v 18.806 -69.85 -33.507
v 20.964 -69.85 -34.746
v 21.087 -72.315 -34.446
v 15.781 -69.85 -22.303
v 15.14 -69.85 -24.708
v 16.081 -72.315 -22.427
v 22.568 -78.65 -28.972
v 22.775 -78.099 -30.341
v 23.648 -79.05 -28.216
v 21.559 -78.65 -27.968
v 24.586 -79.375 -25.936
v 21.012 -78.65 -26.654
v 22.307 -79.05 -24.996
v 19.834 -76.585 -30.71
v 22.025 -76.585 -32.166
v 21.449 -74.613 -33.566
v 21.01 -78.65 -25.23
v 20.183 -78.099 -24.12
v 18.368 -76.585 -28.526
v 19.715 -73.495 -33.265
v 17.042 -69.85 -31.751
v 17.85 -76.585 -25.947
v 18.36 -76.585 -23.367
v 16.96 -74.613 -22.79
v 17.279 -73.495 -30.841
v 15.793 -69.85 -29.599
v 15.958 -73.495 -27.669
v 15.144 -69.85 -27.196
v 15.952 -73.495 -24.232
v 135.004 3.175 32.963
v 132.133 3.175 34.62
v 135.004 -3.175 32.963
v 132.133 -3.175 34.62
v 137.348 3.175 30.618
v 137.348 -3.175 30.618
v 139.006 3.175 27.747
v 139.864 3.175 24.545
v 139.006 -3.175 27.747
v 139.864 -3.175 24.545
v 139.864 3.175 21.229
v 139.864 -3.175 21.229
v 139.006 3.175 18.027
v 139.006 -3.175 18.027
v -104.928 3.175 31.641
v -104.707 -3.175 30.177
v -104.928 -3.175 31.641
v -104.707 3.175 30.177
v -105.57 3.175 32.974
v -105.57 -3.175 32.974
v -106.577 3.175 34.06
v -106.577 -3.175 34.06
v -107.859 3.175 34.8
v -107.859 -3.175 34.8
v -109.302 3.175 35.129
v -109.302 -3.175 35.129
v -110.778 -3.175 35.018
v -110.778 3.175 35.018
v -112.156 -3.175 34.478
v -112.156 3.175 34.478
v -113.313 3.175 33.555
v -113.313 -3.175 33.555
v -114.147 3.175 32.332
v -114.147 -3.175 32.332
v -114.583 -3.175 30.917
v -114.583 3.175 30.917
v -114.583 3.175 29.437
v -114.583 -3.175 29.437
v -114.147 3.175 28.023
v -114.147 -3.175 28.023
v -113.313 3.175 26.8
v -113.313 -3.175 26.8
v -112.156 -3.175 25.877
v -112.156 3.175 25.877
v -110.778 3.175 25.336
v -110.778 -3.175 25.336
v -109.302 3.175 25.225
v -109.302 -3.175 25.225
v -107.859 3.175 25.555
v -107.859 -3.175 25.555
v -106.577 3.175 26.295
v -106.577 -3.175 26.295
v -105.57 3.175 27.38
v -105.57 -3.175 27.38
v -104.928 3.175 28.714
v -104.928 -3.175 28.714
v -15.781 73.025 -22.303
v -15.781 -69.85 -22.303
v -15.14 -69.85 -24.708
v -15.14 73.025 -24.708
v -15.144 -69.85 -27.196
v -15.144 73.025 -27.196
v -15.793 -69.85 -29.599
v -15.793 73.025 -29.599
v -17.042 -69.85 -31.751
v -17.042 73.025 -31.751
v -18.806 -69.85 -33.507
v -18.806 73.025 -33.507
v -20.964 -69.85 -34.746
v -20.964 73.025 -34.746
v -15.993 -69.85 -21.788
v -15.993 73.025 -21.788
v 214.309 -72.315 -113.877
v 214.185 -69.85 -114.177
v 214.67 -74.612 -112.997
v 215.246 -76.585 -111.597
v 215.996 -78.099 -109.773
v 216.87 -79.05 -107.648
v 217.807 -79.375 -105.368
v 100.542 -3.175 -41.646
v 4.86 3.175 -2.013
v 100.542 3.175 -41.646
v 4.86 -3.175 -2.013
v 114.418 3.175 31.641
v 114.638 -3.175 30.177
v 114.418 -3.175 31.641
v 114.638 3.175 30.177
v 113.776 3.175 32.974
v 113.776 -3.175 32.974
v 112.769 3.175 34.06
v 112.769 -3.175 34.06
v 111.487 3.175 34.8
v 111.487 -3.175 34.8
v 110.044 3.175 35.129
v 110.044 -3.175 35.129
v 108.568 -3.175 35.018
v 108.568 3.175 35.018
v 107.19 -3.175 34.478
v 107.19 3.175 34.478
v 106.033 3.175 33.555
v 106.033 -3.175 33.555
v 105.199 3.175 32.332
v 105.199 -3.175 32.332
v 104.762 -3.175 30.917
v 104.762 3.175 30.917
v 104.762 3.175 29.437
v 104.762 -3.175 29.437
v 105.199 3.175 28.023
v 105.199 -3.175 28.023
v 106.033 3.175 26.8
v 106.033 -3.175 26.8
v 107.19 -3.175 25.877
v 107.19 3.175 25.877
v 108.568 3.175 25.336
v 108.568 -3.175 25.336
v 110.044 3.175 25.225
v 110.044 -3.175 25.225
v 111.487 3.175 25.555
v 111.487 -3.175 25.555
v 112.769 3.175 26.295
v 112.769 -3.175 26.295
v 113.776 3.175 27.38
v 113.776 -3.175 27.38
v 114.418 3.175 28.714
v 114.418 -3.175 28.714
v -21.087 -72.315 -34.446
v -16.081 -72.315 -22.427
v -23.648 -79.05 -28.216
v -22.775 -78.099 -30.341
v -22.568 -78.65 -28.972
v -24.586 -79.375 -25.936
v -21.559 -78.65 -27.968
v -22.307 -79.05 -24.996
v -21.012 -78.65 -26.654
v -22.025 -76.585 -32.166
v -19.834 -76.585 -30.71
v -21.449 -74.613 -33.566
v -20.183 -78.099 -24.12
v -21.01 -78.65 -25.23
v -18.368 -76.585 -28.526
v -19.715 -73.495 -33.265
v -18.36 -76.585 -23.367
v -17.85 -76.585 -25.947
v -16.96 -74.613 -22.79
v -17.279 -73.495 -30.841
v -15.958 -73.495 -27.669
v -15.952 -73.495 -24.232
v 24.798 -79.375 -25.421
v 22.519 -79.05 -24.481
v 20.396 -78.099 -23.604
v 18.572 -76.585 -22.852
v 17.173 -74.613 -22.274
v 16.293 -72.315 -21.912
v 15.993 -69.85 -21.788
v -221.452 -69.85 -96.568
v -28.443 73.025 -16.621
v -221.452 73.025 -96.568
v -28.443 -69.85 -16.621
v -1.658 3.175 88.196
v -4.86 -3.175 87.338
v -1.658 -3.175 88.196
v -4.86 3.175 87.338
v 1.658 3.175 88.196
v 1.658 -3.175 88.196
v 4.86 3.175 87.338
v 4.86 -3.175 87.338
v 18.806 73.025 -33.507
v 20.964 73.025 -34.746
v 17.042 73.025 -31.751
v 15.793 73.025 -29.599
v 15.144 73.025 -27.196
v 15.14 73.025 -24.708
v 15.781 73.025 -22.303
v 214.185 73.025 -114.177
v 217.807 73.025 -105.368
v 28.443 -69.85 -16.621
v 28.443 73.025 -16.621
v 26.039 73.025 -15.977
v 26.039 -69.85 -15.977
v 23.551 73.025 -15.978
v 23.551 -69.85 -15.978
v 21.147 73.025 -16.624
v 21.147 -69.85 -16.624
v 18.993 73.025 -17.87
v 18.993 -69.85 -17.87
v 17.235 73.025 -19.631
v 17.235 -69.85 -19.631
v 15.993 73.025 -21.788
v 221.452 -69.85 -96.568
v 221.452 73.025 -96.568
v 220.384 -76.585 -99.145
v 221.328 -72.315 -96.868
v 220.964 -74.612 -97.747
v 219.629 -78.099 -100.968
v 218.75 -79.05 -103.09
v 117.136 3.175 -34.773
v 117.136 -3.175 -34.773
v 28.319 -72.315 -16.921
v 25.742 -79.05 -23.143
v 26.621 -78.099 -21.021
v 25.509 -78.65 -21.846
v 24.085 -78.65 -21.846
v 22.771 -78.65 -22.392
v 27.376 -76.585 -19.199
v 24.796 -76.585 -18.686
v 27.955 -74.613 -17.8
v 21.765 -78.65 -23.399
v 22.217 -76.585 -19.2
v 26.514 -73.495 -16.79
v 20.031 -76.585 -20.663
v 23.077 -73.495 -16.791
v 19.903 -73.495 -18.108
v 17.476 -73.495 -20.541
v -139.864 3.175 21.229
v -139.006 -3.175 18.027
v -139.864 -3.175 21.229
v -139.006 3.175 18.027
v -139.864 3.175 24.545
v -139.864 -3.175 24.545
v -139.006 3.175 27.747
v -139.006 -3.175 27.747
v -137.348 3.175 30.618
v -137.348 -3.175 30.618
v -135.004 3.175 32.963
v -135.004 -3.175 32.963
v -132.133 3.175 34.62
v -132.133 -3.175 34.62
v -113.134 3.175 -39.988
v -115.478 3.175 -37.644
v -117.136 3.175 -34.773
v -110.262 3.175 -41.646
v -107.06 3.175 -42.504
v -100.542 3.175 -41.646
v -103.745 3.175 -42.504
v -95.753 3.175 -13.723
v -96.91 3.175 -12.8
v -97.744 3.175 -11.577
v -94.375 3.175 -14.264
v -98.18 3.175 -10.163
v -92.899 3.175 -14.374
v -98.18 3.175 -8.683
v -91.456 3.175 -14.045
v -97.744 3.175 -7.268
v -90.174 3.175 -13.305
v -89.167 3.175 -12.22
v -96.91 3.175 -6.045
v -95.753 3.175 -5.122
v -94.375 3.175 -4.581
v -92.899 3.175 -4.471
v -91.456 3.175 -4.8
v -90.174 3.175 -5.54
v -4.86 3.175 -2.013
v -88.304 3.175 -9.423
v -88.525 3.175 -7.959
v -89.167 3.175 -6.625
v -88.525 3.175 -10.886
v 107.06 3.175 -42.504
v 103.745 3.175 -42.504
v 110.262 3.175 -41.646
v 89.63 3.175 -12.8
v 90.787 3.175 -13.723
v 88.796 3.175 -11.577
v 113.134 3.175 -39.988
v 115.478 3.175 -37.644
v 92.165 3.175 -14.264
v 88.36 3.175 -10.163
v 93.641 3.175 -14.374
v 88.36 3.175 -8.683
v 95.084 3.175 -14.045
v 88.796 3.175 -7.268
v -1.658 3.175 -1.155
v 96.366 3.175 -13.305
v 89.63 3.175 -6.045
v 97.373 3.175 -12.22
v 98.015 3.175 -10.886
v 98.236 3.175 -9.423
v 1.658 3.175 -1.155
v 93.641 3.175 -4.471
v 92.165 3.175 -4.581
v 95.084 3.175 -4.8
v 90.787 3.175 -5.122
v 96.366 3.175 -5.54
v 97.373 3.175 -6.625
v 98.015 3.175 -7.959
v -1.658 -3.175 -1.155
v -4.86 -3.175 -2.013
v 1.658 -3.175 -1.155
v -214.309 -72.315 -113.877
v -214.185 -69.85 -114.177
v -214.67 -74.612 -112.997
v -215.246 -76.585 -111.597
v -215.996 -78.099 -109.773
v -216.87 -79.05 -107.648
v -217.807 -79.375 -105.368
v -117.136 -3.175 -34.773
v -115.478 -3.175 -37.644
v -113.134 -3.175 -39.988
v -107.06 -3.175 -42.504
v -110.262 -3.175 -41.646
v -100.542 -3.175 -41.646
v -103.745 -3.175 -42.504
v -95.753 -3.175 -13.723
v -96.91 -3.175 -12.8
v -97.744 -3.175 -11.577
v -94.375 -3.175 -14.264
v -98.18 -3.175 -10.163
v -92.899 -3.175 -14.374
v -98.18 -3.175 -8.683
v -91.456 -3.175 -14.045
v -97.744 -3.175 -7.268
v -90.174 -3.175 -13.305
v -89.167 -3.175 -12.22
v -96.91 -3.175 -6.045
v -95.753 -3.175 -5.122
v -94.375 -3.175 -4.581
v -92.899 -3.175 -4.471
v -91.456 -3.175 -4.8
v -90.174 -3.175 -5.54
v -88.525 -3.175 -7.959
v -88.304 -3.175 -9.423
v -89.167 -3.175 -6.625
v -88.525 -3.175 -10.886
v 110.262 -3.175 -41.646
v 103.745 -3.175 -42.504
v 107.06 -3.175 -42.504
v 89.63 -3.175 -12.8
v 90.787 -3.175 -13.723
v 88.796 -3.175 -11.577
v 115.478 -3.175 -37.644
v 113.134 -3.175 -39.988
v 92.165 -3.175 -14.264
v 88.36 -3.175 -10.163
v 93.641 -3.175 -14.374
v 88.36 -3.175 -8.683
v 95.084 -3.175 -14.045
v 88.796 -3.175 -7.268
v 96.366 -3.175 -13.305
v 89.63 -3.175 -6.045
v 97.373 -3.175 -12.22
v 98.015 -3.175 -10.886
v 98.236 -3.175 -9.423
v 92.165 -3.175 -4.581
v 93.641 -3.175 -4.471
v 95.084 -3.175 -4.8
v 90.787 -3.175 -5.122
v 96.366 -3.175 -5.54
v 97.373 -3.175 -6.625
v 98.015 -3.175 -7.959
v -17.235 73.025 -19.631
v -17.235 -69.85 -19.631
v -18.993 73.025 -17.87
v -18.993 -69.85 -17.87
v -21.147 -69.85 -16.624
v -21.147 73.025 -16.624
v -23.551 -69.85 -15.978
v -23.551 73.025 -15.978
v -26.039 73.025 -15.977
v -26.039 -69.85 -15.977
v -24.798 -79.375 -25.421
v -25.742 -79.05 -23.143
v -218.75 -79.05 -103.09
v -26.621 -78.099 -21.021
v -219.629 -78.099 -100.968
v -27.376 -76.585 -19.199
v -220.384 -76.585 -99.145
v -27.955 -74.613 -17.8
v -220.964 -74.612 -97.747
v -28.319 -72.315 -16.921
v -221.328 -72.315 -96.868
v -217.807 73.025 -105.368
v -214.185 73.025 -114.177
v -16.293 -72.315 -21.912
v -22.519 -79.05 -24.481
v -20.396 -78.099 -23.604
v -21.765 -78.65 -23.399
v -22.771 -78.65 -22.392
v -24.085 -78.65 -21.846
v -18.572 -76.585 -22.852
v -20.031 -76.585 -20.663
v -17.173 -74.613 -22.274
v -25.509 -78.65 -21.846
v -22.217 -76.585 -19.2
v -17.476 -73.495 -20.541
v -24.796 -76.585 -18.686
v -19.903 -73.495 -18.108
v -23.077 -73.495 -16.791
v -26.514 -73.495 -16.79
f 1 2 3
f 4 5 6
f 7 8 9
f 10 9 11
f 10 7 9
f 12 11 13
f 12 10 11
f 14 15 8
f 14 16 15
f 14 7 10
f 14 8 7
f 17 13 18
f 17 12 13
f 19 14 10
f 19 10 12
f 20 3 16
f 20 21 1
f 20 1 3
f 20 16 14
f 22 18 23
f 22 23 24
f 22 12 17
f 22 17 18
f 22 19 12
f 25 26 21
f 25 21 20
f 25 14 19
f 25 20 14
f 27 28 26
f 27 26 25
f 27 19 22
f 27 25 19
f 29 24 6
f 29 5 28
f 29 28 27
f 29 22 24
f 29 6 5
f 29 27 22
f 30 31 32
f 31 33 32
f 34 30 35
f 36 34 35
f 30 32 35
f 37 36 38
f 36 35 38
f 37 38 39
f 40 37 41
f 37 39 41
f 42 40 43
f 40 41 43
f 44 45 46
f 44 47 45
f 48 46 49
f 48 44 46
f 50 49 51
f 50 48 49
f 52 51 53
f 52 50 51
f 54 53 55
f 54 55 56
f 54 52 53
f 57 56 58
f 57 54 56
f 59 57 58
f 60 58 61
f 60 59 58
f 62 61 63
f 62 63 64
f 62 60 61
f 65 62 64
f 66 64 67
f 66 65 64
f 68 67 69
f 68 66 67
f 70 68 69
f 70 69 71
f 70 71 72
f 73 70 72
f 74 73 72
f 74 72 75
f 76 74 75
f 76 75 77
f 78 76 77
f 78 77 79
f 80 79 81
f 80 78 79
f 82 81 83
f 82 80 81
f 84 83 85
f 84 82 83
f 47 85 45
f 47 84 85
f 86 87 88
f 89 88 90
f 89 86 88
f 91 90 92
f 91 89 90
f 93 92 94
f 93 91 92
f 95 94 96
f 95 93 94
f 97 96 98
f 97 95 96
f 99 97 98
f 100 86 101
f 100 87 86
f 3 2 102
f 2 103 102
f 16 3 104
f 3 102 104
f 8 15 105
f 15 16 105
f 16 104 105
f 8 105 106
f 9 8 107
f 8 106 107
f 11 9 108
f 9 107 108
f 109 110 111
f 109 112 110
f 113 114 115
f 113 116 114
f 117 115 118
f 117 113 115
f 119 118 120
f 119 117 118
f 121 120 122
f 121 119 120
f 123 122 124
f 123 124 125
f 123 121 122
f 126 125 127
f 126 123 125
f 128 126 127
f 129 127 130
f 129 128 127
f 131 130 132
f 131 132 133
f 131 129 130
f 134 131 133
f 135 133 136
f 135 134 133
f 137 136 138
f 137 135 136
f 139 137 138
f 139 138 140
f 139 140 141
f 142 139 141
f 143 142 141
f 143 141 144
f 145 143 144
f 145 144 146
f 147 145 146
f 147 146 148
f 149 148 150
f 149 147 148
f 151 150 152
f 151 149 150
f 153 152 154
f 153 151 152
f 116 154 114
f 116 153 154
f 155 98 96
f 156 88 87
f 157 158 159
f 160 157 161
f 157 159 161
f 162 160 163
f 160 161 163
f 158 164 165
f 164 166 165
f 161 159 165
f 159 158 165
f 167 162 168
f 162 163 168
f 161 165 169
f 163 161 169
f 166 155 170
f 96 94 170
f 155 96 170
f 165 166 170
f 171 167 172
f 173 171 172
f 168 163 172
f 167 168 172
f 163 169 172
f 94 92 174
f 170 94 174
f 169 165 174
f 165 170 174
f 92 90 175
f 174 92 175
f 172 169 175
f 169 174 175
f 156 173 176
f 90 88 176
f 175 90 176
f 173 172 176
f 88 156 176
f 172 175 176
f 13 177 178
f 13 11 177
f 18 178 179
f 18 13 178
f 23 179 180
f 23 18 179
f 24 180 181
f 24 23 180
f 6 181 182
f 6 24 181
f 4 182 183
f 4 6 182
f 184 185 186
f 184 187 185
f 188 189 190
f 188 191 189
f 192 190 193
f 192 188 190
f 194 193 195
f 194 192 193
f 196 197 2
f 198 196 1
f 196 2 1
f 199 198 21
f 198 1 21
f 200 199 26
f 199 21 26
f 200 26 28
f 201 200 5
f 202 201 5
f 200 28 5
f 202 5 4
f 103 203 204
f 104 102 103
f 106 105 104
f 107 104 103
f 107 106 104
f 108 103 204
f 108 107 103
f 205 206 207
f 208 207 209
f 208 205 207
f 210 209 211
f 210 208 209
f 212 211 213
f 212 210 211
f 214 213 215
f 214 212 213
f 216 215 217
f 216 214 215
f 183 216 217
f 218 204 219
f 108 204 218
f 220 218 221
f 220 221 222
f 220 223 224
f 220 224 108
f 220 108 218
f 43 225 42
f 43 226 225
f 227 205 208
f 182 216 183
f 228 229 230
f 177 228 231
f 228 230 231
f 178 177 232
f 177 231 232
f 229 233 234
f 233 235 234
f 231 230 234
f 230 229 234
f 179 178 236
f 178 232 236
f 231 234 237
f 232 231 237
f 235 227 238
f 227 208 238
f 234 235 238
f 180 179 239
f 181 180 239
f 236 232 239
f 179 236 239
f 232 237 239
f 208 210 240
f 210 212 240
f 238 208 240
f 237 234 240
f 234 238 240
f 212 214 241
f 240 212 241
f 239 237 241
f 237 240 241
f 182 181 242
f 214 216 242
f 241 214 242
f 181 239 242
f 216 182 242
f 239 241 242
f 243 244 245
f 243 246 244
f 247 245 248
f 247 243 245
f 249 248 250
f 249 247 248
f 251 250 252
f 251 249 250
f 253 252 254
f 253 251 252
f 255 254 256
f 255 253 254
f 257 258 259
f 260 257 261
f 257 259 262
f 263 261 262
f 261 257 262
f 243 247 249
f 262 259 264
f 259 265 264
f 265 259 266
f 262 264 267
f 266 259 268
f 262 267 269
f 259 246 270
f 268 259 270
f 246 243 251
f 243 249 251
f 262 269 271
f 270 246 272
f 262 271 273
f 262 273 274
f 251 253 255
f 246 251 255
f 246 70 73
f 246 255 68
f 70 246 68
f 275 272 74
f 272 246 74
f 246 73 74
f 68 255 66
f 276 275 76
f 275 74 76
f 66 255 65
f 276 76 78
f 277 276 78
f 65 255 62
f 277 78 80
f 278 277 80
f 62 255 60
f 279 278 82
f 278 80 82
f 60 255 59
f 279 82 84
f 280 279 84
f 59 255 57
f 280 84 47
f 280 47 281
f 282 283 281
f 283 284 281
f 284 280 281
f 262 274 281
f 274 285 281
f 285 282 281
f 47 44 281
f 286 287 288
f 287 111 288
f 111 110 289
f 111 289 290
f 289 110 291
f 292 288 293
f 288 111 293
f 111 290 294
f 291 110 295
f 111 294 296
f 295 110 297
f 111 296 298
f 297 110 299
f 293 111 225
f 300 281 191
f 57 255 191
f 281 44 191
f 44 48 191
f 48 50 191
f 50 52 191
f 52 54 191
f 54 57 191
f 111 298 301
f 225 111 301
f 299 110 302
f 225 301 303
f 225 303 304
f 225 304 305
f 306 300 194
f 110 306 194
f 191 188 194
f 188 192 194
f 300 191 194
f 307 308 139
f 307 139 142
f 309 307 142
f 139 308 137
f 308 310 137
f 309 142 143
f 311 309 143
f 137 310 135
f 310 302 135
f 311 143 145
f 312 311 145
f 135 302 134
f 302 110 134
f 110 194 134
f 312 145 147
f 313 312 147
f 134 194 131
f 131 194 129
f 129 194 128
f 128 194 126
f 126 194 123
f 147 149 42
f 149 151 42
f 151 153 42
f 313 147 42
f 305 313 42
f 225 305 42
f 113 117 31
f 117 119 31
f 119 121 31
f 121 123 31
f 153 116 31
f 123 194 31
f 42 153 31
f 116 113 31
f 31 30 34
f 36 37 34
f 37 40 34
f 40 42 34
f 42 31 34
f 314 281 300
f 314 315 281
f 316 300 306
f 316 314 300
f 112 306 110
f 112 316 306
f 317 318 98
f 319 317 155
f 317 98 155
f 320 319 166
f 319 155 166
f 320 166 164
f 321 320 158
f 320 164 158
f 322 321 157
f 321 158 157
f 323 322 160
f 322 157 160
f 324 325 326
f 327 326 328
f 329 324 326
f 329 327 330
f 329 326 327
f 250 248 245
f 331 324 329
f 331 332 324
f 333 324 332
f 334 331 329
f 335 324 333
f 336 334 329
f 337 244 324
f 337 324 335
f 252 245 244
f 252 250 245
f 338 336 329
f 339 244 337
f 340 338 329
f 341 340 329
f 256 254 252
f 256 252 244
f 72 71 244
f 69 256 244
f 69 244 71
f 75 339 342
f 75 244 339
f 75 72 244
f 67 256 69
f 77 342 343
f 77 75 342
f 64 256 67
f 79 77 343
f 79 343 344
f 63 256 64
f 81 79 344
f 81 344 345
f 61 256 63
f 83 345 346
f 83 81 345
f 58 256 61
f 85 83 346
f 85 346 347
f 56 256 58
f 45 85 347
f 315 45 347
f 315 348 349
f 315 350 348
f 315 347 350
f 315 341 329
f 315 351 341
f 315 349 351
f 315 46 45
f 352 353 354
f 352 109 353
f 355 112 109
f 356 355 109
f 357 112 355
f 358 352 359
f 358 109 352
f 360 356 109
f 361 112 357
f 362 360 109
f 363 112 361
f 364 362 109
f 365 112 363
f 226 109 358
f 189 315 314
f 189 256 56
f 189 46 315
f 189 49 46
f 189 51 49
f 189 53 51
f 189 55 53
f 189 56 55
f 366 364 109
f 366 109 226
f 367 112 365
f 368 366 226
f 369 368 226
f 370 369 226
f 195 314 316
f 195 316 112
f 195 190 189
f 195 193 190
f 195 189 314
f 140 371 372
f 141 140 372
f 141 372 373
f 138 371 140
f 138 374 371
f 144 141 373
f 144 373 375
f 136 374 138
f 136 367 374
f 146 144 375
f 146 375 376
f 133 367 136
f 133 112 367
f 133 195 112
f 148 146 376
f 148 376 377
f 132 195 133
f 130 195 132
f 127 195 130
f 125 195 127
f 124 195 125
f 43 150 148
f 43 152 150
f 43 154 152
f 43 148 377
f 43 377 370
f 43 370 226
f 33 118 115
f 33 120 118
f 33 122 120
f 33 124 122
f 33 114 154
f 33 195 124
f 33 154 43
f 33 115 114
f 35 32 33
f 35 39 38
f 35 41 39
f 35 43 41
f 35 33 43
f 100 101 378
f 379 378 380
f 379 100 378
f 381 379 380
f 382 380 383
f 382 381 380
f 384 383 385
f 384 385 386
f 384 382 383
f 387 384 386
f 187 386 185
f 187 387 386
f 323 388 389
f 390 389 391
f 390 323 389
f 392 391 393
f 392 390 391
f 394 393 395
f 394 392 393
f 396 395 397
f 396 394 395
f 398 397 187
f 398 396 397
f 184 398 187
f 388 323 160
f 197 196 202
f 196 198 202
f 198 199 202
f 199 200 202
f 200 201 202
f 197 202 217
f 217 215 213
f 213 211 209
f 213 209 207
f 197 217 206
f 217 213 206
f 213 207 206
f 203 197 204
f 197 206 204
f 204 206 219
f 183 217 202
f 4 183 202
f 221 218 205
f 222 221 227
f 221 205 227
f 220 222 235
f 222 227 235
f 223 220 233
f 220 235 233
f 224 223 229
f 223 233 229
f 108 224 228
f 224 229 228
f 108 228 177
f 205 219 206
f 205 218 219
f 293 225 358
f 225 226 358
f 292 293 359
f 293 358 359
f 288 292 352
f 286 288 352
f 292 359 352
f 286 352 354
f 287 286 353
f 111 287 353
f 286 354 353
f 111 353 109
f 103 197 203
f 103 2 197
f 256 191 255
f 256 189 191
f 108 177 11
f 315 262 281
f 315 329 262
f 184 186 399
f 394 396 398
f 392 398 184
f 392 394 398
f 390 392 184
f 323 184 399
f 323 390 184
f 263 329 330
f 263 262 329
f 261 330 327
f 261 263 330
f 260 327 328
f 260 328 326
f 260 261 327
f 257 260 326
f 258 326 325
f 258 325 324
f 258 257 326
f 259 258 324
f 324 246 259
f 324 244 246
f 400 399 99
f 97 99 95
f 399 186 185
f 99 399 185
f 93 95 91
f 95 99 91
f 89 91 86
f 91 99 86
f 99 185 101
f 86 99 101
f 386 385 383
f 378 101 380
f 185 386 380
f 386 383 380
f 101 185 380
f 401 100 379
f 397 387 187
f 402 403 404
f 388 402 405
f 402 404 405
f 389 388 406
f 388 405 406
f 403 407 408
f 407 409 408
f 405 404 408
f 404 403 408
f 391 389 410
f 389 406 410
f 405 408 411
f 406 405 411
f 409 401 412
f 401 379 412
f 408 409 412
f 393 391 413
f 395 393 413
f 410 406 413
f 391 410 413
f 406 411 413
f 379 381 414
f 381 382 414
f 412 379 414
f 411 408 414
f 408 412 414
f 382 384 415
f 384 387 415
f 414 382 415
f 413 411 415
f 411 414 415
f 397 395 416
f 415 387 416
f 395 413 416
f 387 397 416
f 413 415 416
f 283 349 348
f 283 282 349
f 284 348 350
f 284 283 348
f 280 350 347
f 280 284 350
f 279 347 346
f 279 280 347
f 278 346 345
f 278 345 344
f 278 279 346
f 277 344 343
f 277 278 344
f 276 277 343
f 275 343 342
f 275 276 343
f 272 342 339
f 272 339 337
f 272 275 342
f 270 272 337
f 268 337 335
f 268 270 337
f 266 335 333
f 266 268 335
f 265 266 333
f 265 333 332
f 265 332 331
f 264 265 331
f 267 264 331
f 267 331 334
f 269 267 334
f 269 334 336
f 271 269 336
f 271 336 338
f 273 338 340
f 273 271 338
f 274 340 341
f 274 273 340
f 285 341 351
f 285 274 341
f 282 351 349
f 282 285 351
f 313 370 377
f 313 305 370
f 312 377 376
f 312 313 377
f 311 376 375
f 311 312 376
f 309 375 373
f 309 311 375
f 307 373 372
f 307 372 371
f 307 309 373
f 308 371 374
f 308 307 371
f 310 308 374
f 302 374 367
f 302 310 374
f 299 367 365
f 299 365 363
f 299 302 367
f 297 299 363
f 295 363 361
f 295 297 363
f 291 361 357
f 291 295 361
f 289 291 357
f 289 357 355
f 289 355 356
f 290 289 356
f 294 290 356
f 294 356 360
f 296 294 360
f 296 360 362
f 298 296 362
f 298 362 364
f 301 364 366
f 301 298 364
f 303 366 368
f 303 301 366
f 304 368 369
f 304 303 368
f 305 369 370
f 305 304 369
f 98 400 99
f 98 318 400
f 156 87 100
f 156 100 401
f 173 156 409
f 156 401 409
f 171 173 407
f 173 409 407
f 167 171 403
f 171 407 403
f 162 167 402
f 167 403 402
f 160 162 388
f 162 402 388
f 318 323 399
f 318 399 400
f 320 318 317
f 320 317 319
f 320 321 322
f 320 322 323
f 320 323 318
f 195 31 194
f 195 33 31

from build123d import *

# Parameters (mm, degrees)
F0_R     = 4.9657
F1_DEPTH = 3.175
F2_R     = 12.7
F3_DEPTH = 76.2
F4_R     = 9.525
F4_2_R   = 9.525


with BuildPart() as f1:
    # F0 (on Front) → F1 (new body, symmetric)
    with BuildSketch(Plane.XZ):
        Polygon((-112.2754325273, -46.5060068741), (0, 0), (0, 89.3514761341), (-143.8659498691, 29.7602485347), align=None)
        with Locations((-93.2699265011, -9.4226090129)):
            Circle(F0_R, mode=Mode.SUBTRACT)
        with Locations((-109.6726951208, 30.1771774494)):
            Circle(F0_R, mode=Mode.SUBTRACT)
        Polygon((0, 89.3514761341), (0, 0), (112.2754325273, -46.5060068741), (143.8659498691, 29.7602485347), align=None)
        with Locations((93.2699265011, -9.4226090129)):
            Circle(F0_R, mode=Mode.SUBTRACT)
        with Locations((109.6726951208, 30.1771774494)):
            Circle(F0_R, mode=Mode.SUBTRACT)
    extrude(amount=F1_DEPTH, both=True)

    # F2
    f2_edges = [f1.edges().sort_by_distance(p)[0] for p in [
        (-143.86595, 0, 29.760249),
        (0, 0, 89.351476),
        (0, 0, 0),
        (112.275433, 0, -46.506007),
        (143.86595, 0, 29.760249),
        (-112.275433, 0, -46.506007),
    ]]
    fillet(f2_edges, radius=F2_R)


with BuildPart() as f1b:
    # F0 (on Front) → F1, piece 2 (new body, symmetric)
    with BuildSketch(Plane.XZ):
        Polygon((-12.1426400097, -31.1194647295), (-19.6315676376, -12.9711623258), (-221.4519007896, -96.56788148), (-217.8068410963, -105.3678340271), (-214.1852704835, -114.177479383), align=None)
    extrude(amount=F1_DEPTH, both=True)

    # F3 (add, symmetric): a face of the model
    f3_faces = [f1b.faces().sort_by_distance(p)[0] for p in [
        (-116.342910997, -3.175, -63.4985719637),
    ]]
    extrude(f3_faces, amount=F3_DEPTH, both=True)

    # F4#2
    f4_2_edges = [f1b.edges().sort_by_distance(p)[0] for p in [
        (-12.14264, -3.175, -31.119465),
        (-120.541734, -79.375, -54.769522),
        (-113.163955, -79.375, -72.648472),
        (-19.631568, -3.175, -12.971162),
        (-15.887104, -79.375, -22.045314),
    ]]
    fillet(f4_2_edges, radius=F4_2_R)


with BuildPart() as f1c:
    # F0 (on Front) → F1, piece 3 (new body, symmetric)
    with BuildSketch(Plane.XZ):
        Polygon((221.4519007896, -96.56788148), (19.6315676376, -12.9711623258), (12.1426400097, -31.1194647295), (214.1852704835, -114.177479383), (217.8068410963, -105.3678340271), align=None)
    extrude(amount=F1_DEPTH, both=True)

    # F3#2 (add, symmetric): a face of the model
    f3_2_faces = [f1c.faces().sort_by_distance(p)[0] for p in [
        (116.342910997, -3.175, -63.4985719637),
    ]]
    extrude(f3_2_faces, amount=F3_DEPTH, both=True)

    # F4
    f4_edges = [f1c.edges().sort_by_distance(p)[0] for p in [
        (19.631568, -3.175, -12.971162),
        (12.14264, -3.175, -31.119465),
        (120.541734, -79.375, -54.769522),
        (113.163955, -79.375, -72.648472),
        (15.887104, -79.375, -22.045314),
    ]]
    fillet(f4_edges, radius=F4_R)


solid = Compound([f1.part, f1b.part, f1c.part])
